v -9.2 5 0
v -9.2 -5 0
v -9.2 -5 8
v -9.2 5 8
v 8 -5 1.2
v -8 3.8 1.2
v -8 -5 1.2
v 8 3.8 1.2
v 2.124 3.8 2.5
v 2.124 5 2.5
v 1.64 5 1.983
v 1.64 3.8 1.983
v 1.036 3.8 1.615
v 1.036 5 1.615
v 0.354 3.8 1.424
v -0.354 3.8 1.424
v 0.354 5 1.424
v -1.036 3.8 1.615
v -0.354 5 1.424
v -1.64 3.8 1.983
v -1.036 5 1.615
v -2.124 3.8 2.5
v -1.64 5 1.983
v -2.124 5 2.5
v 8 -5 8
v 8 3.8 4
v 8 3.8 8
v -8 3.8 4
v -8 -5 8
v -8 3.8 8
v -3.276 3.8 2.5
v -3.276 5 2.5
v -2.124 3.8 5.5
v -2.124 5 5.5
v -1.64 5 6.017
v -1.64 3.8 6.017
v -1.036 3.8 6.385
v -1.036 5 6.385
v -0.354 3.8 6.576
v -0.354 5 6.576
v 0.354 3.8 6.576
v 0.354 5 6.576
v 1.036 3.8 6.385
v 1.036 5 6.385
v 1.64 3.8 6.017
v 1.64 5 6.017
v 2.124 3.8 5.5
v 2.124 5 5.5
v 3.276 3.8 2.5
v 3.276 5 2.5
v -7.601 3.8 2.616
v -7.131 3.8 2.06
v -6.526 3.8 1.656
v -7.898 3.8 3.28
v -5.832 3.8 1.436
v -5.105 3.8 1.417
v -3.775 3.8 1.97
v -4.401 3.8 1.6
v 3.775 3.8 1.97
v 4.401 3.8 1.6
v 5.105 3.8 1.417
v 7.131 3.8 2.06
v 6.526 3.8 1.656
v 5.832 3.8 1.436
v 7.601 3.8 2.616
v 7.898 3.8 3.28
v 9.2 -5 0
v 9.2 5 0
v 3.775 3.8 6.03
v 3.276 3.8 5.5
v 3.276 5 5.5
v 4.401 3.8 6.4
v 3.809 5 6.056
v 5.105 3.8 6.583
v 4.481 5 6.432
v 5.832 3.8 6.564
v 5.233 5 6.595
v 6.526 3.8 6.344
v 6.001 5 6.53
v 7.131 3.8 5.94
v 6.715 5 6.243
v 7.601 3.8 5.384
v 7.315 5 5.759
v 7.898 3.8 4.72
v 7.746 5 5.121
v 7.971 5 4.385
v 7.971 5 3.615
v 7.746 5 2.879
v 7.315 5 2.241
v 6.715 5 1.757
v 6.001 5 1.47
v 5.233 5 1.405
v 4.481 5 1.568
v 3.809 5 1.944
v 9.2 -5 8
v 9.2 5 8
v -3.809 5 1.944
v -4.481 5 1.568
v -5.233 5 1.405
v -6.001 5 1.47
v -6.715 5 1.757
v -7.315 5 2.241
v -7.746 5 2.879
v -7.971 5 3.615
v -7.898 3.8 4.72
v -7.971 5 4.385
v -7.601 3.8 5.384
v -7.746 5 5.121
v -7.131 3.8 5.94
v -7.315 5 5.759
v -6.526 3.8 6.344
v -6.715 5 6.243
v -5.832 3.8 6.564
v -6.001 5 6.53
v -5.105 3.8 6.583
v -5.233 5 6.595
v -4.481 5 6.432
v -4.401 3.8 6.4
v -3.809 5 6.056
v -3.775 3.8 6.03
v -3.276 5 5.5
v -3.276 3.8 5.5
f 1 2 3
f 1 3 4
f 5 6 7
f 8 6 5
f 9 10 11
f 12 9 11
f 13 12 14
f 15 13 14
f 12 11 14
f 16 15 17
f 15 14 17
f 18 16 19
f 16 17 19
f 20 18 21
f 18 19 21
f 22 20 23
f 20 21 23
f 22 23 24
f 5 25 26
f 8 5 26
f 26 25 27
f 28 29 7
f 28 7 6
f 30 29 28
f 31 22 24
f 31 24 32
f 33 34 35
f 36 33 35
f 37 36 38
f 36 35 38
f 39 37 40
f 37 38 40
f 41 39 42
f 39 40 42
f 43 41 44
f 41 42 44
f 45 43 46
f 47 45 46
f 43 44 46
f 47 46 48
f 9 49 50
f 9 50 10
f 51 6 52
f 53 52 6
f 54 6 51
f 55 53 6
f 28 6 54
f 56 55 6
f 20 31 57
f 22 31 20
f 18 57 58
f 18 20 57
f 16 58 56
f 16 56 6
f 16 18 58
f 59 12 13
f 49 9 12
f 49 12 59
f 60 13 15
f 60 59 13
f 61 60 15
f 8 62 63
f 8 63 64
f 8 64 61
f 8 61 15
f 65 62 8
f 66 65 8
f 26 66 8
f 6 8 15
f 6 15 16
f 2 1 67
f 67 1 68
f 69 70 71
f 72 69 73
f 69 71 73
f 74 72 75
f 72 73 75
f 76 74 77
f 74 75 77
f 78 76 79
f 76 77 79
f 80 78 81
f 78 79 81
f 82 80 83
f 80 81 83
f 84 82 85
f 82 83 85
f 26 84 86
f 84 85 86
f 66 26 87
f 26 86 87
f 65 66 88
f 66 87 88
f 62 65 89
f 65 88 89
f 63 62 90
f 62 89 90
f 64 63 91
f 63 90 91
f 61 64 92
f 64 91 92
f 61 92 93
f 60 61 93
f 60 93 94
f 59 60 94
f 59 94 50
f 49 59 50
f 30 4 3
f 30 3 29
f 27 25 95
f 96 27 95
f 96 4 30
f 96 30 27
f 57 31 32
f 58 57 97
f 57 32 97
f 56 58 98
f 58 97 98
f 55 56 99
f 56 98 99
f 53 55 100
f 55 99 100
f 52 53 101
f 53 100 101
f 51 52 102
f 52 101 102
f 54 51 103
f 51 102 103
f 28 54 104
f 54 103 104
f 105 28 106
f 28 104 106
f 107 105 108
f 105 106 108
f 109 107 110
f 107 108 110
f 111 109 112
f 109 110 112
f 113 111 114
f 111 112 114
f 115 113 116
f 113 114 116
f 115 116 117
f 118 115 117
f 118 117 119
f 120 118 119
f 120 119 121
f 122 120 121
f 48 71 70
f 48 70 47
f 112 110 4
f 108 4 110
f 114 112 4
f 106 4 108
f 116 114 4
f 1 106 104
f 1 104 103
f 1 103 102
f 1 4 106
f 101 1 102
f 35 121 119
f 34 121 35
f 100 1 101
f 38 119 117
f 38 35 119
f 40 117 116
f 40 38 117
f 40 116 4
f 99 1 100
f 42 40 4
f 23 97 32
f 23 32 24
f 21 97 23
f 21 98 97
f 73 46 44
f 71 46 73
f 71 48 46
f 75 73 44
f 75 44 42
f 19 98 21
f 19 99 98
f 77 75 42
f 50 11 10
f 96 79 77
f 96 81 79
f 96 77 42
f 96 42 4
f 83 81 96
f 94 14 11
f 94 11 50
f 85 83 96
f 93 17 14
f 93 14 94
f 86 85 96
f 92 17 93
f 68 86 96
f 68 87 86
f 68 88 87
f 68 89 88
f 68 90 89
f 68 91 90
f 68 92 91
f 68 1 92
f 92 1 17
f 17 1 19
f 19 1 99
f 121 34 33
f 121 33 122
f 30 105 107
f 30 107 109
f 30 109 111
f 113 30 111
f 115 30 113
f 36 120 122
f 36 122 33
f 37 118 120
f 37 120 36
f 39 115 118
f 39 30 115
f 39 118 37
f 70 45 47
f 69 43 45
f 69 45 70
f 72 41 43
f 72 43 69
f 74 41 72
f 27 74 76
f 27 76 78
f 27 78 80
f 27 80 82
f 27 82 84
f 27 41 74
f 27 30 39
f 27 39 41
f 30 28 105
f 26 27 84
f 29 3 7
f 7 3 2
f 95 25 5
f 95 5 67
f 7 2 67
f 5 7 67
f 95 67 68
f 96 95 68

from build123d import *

# Parameters (mm, degrees)
SKETCH_W        = 18.4
SKETCH_H        = 10
PAD_DEPTH       = 8
SKETCH002_R     = 2.6
POCKET_DEPTH    = 10
SKETCH003_W     = 16
SKETCH003_H     = 8.8
POCKET001_DEPTH = 6.8
SKETCH004_W     = 10.8
SKETCH004_H     = 3
POCKET002_DEPTH = 5


with BuildPart() as part:
    # Sketch → Pad (new body)
    with BuildSketch(Plane.XY):
        Rectangle(SKETCH_W, SKETCH_H)
    extrude(amount=PAD_DEPTH)

    # Sketch002 (on Face3 of Pad) → Pocket (cut)
    with BuildSketch(Plane(origin=(0, 5, 0), x_dir=(-1, 0, 0), z_dir=(0, 1, 0))):
        with Locations((-5.4, 4)):
            Circle(SKETCH002_R)
        with Locations((0, 4)):
            Circle(SKETCH002_R)
        with Locations((5.4, 4)):
            Circle(SKETCH002_R)
    extrude(amount=-POCKET_DEPTH, mode=Mode.SUBTRACT)

    # Sketch003 (on Face4 of Pocket) → Pocket001 (cut)
    with BuildSketch(Plane.XY.offset(8)):
        with Locations((0, -0.6)):
            Rectangle(SKETCH003_W, SKETCH003_H)
    extrude(amount=-POCKET001_DEPTH, mode=Mode.SUBTRACT)

    # Sketch004 (on Face7 of Pocket001) → Pocket002 (cut)
    with BuildSketch(Plane(origin=(0, 5, 0), x_dir=(-1, 0, 0), z_dir=(0, 1, 0))):
        with Locations((0, 4)):
            Rectangle(SKETCH004_W, SKETCH004_H)
    extrude(amount=-POCKET002_DEPTH, mode=Mode.SUBTRACT)


solid = part.part
